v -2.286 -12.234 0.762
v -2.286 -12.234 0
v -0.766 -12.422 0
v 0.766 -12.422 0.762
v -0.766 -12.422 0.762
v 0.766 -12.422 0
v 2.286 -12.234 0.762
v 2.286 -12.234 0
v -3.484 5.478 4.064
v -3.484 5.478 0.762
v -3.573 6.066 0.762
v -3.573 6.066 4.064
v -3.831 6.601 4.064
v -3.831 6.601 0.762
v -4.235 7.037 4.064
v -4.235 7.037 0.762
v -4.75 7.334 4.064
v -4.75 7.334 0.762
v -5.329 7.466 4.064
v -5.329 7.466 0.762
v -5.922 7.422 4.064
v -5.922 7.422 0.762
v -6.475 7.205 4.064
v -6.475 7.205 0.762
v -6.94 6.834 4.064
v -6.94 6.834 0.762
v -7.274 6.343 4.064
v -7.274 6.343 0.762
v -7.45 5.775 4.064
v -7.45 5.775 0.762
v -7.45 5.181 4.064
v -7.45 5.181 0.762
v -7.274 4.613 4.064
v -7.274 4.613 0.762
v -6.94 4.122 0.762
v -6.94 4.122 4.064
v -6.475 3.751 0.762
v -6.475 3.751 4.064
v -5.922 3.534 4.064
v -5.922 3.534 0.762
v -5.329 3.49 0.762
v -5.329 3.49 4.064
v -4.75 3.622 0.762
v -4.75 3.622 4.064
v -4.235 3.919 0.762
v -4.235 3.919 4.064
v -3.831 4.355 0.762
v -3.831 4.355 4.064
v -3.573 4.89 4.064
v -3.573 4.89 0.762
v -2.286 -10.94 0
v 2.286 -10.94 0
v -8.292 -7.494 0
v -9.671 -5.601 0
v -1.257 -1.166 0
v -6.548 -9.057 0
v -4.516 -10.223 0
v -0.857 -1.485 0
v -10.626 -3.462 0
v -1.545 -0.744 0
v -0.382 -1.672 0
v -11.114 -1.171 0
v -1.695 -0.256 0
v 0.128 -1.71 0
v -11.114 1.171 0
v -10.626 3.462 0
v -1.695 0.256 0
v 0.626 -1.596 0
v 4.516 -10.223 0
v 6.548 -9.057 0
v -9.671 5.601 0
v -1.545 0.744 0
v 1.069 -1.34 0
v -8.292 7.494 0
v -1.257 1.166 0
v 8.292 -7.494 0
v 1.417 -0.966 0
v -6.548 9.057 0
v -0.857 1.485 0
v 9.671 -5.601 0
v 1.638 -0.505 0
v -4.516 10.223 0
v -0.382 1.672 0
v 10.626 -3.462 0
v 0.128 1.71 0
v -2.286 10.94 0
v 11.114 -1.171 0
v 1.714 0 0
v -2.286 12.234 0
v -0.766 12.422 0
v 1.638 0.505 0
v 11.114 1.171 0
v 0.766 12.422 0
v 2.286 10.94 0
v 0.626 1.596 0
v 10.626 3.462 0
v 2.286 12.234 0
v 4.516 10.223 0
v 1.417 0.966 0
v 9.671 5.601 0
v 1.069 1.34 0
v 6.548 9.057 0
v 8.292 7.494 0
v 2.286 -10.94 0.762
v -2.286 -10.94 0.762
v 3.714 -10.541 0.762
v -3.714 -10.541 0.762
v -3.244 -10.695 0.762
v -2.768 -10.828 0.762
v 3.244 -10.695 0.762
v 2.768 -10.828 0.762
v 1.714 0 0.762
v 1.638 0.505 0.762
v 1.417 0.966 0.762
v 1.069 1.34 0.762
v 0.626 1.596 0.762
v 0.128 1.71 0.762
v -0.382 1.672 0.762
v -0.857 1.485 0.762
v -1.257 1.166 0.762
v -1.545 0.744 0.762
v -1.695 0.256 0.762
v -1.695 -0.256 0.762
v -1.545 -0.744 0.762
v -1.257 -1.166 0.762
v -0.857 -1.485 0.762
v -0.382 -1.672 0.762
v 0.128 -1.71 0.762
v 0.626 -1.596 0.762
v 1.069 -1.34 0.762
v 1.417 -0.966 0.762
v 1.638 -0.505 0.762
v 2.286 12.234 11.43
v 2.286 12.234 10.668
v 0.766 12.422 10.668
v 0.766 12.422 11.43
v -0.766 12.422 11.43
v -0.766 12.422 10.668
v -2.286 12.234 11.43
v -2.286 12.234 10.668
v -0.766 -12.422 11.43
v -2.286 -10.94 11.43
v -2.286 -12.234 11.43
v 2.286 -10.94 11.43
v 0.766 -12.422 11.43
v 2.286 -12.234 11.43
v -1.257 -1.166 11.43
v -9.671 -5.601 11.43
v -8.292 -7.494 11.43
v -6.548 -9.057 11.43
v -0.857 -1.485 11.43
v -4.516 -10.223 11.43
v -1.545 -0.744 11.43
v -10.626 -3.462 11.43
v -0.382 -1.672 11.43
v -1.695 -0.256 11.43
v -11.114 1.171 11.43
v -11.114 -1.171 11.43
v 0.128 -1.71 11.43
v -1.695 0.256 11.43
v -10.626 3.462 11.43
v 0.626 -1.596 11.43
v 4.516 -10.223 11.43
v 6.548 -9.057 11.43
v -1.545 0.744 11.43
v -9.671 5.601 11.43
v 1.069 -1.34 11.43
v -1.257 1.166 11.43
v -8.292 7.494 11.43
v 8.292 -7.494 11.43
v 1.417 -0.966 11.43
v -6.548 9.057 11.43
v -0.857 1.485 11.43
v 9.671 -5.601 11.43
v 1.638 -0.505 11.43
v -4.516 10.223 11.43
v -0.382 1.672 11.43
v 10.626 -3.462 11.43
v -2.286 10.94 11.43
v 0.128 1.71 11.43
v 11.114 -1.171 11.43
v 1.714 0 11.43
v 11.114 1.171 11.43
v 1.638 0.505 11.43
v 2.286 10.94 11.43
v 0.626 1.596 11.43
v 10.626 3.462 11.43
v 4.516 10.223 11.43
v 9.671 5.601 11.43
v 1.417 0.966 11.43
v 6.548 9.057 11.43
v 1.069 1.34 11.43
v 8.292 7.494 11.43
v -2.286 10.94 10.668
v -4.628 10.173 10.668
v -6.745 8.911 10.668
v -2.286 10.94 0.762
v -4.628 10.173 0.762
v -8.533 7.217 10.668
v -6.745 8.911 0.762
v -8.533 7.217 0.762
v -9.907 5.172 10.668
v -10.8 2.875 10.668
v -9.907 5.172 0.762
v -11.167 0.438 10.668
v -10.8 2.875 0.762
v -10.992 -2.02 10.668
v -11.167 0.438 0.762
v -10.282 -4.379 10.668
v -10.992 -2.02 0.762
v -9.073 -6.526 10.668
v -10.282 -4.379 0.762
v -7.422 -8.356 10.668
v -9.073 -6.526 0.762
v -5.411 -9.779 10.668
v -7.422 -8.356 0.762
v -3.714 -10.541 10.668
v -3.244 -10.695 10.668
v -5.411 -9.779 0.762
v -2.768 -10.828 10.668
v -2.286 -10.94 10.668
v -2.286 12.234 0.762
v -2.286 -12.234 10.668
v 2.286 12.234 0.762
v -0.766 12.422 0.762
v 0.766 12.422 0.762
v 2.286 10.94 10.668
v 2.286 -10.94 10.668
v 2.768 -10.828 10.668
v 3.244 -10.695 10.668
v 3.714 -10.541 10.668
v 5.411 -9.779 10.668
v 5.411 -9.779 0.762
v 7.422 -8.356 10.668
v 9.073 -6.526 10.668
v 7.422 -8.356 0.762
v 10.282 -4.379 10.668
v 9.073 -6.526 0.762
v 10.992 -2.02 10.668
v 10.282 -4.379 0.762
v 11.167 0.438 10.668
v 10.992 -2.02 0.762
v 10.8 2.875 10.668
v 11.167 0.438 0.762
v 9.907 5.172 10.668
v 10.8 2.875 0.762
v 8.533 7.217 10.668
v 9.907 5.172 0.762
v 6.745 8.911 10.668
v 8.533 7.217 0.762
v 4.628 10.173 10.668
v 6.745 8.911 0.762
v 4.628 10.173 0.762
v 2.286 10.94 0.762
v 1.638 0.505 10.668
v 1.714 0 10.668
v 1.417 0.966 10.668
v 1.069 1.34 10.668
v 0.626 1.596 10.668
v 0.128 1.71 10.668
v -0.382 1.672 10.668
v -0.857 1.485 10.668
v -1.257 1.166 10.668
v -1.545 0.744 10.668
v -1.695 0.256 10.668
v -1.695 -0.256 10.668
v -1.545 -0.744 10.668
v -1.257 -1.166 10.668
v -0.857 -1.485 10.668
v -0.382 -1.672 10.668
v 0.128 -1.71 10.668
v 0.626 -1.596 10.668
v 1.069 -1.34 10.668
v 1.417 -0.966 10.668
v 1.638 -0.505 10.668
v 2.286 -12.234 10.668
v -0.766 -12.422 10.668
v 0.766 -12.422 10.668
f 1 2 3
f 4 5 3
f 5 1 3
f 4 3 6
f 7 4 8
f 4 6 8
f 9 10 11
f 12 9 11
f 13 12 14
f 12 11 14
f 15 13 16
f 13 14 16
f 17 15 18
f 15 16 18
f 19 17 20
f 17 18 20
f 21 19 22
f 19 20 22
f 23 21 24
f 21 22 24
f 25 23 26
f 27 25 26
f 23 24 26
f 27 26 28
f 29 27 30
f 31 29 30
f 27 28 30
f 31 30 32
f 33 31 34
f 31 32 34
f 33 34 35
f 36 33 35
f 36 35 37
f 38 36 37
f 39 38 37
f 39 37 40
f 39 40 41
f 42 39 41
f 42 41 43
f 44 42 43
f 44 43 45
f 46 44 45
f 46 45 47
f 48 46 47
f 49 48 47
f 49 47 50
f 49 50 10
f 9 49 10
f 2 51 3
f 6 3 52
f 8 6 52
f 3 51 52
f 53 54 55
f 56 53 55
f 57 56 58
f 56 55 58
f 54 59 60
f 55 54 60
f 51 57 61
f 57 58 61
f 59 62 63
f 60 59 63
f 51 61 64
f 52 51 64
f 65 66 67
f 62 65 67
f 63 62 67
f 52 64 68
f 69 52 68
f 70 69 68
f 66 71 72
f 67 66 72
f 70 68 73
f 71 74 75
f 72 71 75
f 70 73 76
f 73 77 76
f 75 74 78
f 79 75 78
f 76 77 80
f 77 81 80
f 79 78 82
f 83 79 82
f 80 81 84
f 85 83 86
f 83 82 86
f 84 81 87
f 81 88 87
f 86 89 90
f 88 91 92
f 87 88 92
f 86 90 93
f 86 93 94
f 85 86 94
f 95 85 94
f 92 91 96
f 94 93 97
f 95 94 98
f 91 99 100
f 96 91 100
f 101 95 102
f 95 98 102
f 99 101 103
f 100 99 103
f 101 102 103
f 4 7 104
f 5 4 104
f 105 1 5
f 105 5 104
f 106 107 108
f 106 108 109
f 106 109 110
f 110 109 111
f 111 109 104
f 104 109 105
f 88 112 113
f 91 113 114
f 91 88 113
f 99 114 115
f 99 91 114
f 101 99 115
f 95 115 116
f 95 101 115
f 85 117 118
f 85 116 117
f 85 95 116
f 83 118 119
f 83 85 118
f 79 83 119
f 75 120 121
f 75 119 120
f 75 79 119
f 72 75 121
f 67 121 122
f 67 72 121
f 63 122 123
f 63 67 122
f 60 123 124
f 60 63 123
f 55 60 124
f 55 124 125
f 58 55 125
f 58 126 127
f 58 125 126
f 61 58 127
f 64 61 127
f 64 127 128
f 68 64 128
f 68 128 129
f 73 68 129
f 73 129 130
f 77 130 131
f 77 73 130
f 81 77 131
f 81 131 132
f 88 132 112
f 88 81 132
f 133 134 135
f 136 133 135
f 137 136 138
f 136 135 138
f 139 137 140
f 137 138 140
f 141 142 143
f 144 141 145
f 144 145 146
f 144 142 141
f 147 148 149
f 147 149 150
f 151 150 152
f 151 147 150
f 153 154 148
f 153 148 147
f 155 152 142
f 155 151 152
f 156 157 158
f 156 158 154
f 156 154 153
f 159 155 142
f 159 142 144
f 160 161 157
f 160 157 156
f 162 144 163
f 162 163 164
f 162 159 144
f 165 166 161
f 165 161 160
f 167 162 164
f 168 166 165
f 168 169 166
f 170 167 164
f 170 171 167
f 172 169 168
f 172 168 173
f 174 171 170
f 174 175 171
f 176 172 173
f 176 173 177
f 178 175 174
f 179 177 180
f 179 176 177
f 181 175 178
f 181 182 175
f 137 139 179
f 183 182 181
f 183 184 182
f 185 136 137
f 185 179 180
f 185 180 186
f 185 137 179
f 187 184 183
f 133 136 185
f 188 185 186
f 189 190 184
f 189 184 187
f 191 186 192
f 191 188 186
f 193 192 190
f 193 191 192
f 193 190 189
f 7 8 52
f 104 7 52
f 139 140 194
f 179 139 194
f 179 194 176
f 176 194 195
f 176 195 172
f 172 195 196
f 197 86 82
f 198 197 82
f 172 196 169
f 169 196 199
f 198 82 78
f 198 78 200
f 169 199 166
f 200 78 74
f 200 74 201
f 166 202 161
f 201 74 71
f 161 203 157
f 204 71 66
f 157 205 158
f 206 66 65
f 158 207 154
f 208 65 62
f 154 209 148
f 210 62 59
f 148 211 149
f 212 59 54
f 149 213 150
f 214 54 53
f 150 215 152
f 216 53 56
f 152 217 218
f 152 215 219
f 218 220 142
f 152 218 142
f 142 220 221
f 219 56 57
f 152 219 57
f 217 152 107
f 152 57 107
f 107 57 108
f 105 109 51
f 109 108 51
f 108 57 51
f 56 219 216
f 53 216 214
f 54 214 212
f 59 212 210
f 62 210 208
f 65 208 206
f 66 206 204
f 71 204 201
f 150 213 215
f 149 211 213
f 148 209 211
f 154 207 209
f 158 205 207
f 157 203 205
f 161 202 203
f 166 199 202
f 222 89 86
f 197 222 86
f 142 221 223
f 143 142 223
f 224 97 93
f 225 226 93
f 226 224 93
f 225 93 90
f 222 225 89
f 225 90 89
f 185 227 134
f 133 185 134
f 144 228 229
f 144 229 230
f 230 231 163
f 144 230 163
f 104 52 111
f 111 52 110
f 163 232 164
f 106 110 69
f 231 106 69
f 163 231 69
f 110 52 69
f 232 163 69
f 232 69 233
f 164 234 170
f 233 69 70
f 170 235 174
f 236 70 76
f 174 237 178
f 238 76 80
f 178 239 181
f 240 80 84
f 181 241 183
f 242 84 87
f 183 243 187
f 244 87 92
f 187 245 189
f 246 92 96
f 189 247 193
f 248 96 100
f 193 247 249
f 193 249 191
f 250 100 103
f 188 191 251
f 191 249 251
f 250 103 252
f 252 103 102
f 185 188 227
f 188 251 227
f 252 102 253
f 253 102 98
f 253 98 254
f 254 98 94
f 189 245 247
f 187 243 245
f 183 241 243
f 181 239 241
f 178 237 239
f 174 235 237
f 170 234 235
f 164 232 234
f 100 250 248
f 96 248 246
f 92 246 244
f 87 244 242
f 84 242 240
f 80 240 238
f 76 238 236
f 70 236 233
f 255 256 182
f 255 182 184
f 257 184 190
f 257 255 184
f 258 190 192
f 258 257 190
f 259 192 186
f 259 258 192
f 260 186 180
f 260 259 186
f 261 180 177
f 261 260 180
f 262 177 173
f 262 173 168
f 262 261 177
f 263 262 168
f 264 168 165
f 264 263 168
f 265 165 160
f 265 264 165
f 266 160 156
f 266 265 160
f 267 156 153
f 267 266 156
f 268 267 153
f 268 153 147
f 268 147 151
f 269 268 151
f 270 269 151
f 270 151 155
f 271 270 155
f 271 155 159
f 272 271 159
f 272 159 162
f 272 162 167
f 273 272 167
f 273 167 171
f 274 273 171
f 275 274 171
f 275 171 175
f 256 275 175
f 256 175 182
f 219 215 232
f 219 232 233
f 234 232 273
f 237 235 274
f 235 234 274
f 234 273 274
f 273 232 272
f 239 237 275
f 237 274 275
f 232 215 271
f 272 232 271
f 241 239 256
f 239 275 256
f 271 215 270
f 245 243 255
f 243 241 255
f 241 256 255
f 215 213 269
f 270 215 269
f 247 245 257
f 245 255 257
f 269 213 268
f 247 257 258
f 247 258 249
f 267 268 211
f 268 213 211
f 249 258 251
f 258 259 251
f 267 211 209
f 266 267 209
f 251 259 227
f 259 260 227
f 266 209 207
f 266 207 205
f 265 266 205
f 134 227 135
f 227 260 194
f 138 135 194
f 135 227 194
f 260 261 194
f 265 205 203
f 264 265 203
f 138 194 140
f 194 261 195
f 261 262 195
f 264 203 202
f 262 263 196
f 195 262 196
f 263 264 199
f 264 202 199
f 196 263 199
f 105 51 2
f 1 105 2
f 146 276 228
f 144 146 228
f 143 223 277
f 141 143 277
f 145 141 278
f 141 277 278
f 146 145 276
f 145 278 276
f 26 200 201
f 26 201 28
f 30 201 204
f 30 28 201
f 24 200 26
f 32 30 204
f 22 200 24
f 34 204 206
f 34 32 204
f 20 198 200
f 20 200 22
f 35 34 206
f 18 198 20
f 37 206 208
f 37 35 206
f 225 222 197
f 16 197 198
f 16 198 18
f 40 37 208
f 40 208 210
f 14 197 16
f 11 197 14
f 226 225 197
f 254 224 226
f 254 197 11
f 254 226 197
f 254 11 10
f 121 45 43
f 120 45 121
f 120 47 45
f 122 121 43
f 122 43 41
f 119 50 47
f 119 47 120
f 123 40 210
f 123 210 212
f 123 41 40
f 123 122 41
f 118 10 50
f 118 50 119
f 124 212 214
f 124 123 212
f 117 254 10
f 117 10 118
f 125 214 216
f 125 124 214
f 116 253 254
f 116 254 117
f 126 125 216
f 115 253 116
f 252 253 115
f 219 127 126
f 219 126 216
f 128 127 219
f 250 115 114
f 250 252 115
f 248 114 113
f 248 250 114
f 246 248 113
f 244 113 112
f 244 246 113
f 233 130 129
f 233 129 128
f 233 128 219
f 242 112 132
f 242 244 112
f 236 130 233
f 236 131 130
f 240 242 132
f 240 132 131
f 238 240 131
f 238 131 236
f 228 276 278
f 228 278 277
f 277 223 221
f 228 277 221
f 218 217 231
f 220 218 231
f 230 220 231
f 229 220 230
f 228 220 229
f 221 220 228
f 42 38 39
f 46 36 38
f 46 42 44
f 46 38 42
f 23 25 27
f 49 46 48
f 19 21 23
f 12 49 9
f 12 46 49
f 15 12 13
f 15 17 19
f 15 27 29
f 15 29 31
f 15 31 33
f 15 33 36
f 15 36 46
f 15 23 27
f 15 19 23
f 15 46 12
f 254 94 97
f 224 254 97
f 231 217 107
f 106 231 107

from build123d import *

# Parameters (mm, degrees)
SKETCH1_R               = 1.7145
BOSS_EXTRUDE1_DEPTH     = 11.43
SKETCH2_W               = 9.906
SKETCH2_H               = 2.54
CUT_EXTRUDE1_DEPTH      = 21.259585188
CUT_EXTRUDE1_DEPTH_BACK = 21.259585188
SKETCH4_W               = 9.906
SKETCH4_H               = 20.955
SKETCH4_H_2             = 0.635
SKETCH3_R               = 1.9939
BOSS_EXTRUDE2_DEPTH     = 4.064


with BuildPart() as part:
    # Sketch1 → Boss-Extrude1 (new body)
    with BuildSketch(Plane.XY):
        with BuildLine():
            Line((-2.286, 12.234260092), (-2.286, 10.939706577))
            ThreePointArc((-2.286, 10.939706577), (-11.176, 0), (-2.286, -10.939706577))
            Line((-2.286, -10.939706577), (-2.286, -12.234260092))
            ThreePointArc((-2.286, -12.234260092), (0, -12.446), (2.286, -12.234260092))
            Line((2.286, -12.234260092), (2.286, -10.939706577))
            ThreePointArc((2.286, -10.939706577), (11.176, 0), (2.286, 10.939706577))
            Line((2.286, 10.939706577), (2.286, 12.234260092))
            ThreePointArc((2.286, 12.234260092), (0, 12.446), (-2.286, 12.234260092))
        make_face()
        Circle(SKETCH1_R, mode=Mode.SUBTRACT)
    extrude(amount=BOSS_EXTRUDE1_DEPTH)

    # Sketch2 → Cut-Revolve1 (revolve, cut)
    with BuildSketch(Plane(origin=(0, 0, 0), x_dir=(0, 0, -1), z_dir=(1, 0, 0)), mode=Mode.PRIVATE) as cut_revolve1_sk:
        with Locations((-5.715, 12.446)):
            Rectangle(SKETCH2_W, SKETCH2_H)
    revolve(cut_revolve1_sk.sketch.rotate(Axis((0, 0, 11.43), (0, 0, -1)), 348.19710831), axis=Axis((0, 0, 11.43), (0, 0, -1)), mode=Mode.SUBTRACT)

    # Sketch4 → Cut-Extrude1 (cut, two sides: drawn at the far end of the back side and taken through both)
    with BuildSketch(Plane(origin=(0, 0, 0), x_dir=(0, 0, -1), z_dir=(1, 0, 0)).offset(-CUT_EXTRUDE1_DEPTH_BACK)):
        with Locations((-5.715, 0.6985)):
            Rectangle(SKETCH4_W, SKETCH4_H)
        with Locations((-5.715, -10.8585)):
            Rectangle(SKETCH4_W, SKETCH4_H_2)
    extrude(amount=CUT_EXTRUDE1_DEPTH + CUT_EXTRUDE1_DEPTH_BACK, mode=Mode.SUBTRACT)

    # Sketch3 → Boss-Extrude2 (add)
    with BuildSketch(Plane.XY):
        with Locations((-5.477956234, 5.477956234)):
            Circle(SKETCH3_R)
    extrude(amount=BOSS_EXTRUDE2_DEPTH)


solid = part.part
